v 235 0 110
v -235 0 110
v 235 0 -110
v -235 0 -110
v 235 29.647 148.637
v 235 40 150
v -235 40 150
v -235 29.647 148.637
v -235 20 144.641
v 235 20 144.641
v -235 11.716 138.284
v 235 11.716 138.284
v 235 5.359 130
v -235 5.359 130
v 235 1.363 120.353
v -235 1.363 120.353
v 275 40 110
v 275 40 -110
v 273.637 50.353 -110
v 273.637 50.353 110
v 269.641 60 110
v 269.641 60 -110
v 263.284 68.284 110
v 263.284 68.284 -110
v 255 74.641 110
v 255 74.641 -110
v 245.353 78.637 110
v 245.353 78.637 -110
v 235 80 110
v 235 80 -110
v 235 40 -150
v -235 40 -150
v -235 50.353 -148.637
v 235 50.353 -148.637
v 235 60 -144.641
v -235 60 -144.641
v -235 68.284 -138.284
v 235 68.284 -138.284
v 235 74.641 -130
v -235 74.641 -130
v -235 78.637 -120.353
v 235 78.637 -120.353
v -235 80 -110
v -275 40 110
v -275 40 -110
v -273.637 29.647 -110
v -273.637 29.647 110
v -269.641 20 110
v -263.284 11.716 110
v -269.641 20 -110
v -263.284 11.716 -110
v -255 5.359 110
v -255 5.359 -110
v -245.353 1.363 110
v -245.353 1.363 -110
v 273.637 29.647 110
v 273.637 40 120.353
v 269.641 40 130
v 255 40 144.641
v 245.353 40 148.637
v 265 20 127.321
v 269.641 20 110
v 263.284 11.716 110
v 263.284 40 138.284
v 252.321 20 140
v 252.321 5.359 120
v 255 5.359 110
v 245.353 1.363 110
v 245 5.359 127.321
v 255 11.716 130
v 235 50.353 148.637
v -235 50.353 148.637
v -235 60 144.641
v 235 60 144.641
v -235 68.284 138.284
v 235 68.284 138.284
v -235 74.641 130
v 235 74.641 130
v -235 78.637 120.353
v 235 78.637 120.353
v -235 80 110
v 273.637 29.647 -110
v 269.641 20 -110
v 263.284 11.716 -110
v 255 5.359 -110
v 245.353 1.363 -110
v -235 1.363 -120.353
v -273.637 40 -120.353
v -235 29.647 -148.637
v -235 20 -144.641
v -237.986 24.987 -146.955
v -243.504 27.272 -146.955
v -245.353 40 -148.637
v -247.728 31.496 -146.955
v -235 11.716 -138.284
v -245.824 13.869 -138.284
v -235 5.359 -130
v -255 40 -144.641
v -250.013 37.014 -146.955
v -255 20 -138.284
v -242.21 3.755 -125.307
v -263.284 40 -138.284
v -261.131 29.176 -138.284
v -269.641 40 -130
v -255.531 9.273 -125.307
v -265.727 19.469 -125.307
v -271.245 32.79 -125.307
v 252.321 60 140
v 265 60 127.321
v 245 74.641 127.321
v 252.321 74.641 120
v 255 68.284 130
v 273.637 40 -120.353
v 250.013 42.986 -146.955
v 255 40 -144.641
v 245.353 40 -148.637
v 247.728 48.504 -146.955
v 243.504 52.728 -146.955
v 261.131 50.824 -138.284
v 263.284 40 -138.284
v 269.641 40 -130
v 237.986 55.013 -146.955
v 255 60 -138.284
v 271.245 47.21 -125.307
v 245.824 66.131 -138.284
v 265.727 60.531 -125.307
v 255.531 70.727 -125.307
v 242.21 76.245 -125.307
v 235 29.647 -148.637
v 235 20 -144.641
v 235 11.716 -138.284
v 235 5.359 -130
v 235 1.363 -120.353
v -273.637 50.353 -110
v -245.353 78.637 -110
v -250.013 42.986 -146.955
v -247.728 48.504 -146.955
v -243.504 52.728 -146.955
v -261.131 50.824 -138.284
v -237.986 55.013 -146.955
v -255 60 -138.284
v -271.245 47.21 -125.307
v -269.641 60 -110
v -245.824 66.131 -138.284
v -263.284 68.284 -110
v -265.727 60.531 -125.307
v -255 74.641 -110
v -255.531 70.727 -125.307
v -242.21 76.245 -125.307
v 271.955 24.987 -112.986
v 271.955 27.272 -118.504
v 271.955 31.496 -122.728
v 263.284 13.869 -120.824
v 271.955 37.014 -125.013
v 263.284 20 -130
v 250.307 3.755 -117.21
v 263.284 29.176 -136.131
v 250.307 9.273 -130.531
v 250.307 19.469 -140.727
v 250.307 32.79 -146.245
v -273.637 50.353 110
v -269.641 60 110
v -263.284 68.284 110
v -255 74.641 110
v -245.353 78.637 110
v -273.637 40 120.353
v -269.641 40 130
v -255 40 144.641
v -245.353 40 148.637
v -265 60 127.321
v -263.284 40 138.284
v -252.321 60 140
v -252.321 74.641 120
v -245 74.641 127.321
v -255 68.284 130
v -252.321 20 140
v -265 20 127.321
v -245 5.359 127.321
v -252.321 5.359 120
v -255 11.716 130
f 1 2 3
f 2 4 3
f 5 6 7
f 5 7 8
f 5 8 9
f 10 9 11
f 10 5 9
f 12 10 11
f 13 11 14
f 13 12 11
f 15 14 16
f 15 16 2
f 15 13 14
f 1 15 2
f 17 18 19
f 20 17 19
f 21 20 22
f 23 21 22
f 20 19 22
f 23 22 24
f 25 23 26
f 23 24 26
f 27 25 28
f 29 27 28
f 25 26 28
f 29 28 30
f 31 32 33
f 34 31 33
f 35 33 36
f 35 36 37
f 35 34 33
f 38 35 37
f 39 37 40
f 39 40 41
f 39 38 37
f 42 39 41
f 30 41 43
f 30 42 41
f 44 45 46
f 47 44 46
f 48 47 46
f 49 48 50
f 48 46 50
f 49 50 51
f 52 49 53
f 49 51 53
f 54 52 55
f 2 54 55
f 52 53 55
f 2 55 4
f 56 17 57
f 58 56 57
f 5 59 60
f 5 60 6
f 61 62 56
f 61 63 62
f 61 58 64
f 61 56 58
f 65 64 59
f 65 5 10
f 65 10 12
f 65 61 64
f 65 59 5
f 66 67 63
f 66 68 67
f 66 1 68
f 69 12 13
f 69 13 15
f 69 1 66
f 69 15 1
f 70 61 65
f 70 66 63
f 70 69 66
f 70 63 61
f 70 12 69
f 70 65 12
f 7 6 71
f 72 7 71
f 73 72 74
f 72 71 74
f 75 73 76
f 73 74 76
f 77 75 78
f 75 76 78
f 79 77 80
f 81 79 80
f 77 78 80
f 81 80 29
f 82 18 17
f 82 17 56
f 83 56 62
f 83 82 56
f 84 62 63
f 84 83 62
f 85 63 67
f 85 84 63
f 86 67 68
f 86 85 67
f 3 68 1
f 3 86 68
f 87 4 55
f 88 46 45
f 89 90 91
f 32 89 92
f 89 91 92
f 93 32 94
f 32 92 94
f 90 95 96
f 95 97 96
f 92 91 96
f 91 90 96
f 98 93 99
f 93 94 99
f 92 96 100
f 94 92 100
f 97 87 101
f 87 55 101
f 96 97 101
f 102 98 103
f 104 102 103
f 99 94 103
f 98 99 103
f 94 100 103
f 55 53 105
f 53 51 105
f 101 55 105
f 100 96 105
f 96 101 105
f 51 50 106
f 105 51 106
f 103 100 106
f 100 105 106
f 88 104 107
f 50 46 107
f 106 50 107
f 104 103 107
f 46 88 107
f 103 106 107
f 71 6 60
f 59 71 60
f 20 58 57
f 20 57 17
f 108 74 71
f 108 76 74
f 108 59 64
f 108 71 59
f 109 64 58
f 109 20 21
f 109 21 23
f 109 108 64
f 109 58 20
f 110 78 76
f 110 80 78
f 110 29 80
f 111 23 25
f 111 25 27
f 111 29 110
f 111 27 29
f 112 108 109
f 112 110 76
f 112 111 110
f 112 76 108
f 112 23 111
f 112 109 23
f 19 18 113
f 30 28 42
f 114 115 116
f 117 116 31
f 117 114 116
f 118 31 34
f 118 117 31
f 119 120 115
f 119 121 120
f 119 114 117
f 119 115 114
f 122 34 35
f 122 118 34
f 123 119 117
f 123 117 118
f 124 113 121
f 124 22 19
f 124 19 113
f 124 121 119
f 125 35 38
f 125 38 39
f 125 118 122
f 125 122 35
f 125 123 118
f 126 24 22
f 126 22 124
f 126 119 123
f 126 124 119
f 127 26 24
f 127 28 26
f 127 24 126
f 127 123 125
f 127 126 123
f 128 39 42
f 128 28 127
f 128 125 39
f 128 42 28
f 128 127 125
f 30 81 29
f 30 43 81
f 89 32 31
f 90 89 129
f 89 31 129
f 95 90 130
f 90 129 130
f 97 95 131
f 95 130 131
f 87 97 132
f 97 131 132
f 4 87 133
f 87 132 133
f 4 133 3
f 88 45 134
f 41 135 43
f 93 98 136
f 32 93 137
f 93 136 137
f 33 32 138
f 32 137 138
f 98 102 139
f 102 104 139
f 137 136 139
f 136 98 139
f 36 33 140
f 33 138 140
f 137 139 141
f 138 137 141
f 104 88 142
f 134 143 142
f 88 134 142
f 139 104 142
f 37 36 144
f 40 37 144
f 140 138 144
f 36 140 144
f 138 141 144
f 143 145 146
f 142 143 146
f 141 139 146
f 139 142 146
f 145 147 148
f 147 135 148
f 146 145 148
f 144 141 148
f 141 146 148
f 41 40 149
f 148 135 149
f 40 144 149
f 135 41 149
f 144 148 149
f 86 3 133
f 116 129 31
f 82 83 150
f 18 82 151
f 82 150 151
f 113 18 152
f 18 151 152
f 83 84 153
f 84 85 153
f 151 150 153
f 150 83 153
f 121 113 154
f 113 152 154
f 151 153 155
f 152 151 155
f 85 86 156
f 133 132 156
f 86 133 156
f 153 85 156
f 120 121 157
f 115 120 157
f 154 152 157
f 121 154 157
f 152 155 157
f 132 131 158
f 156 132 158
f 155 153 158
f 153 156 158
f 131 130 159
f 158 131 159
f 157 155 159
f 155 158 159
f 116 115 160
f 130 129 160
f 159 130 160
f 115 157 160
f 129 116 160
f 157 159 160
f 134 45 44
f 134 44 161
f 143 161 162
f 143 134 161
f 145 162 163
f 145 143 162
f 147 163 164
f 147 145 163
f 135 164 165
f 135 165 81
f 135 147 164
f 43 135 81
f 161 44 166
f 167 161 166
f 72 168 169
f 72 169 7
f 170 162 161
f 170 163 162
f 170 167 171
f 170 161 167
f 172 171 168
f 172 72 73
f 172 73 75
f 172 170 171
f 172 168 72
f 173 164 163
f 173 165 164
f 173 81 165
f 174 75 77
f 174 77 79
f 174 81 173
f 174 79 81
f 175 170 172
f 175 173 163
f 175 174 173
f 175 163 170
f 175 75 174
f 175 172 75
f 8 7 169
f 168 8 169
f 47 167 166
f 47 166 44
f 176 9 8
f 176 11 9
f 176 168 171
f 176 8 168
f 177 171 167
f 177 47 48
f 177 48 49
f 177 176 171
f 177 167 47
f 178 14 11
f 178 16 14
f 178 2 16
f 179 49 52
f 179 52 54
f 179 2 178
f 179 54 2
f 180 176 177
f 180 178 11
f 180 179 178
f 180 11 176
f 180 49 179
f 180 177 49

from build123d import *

# Parameters (mm, degrees)
SKETCH1_W           = 550
SKETCH1_H           = 300
BOSS_EXTRUDE1_DEPTH = 80
FILLET1_R           = 40
FILLET2_R           = 40


# Some blends are built 0.0001 mm under size
with BuildPart() as part:
    # Sketch1 → Boss-Extrude1 (new body)
    with BuildSketch(Plane(origin=(0, 0, 0), x_dir=(1, 0, 0), z_dir=(0, 1, 0))):
        Rectangle(SKETCH1_W, SKETCH1_H)
    extrude(amount=BOSS_EXTRUDE1_DEPTH)

    # Fillet1
    fillet1_edges = [part.edges().sort_by_distance(p)[0] for p in [
        (-275, 80, 0),
        (0, 80, 150),
        (275, 80, 0),
        (0, 0, 150),
        (-275, 0, 0),
        (0, 0, -150),
        (275, 0, 0),
        (-275, 40, -150),
        (275, 40, -150),
        (0, 80, -150),
    ]]
    fillet(fillet1_edges, radius=FILLET1_R - 0.0001)  # a hair under: the kernel refuses the full size

    # Fillet2
    # the kernel refuses this fillet: 40 mm, written as the material it takes off along each edge
    with BuildSketch(Plane(origin=(235, 0, 110), x_dir=(1, 0, 0), z_dir=(0, 0, -1))) as fillet2_piece_1:
        with BuildLine():
            CenterArc((0.0001, -39.9999), 39.9999, 0, 90)
            Line((40, -39.9999), (40, 0))
            Line((40, 0), (0.0001, 0))
        make_face()
    revolve(axis=Axis((235, 0, 110), (0, -1, 0)), revolution_arc=90, mode=Mode.SUBTRACT)
    with BuildSketch(Plane(origin=(-235, 0, 110), x_dir=(0, 0, 1), z_dir=(1, 0, 0))) as fillet2_piece_2:
        with BuildLine():
            CenterArc((0.0001, -39.9999), 39.9999, 0, 90)
            Line((40, -39.9999), (40, 0))
            Line((40, 0), (0.0001, 0))
        make_face()
    revolve(axis=Axis((-235, 0, 110), (0, -1, 0)), revolution_arc=90, mode=Mode.SUBTRACT)
    with BuildSketch(Plane(origin=(-235, 80, 110), x_dir=(-1, 0, 0), z_dir=(0, 0, -1))) as fillet2_piece_3:
        with BuildLine():
            CenterArc((0.0001, -39.9999), 39.9999, 0, 90)
            Line((40, -39.9999), (40, 0))
            Line((40, 0), (0.0001, 0))
        make_face()
    revolve(axis=Axis((-235, 80, 110), (0, 1, 0)), revolution_arc=90, mode=Mode.SUBTRACT)
    with BuildSketch(Plane(origin=(235, 80, 110), x_dir=(0, 0, 1), z_dir=(-1, 0, 0))) as fillet2_piece_4:
        with BuildLine():
            CenterArc((0.0001, -39.9999), 39.9999, 0, 90)
            Line((40, -39.9999), (40, 0))
            Line((40, 0), (0.0001, 0))
        make_face()
    revolve(axis=Axis((235, 80, 110), (0, 1, 0)), revolution_arc=90, mode=Mode.SUBTRACT)
    with BuildSketch(Plane(origin=(275, 0, 150), x_dir=(0, 0, -1), z_dir=(0, 1, 0))) as fillet2_piece_5:
        with BuildLine():
            CenterArc((FILLET2_R, FILLET2_R), FILLET2_R, 180, 90)
            Line((0, FILLET2_R), (0, 0))
            Line((0, 0), (FILLET2_R, 0))
        make_face()
    extrude(amount=80, mode=Mode.SUBTRACT)
    with BuildSketch(Plane(origin=(-275, 0, 150), x_dir=(0, 0, -1), z_dir=(0, 1, 0))) as fillet2_piece_6:
        with BuildLine():
            CenterArc((FILLET2_R, -FILLET2_R), FILLET2_R, 90, 90)
            Line((0, -FILLET2_R), (0, 0))
            Line((0, 0), (FILLET2_R, 0))
        make_face()
    extrude(amount=80, mode=Mode.SUBTRACT)


solid = part.part
